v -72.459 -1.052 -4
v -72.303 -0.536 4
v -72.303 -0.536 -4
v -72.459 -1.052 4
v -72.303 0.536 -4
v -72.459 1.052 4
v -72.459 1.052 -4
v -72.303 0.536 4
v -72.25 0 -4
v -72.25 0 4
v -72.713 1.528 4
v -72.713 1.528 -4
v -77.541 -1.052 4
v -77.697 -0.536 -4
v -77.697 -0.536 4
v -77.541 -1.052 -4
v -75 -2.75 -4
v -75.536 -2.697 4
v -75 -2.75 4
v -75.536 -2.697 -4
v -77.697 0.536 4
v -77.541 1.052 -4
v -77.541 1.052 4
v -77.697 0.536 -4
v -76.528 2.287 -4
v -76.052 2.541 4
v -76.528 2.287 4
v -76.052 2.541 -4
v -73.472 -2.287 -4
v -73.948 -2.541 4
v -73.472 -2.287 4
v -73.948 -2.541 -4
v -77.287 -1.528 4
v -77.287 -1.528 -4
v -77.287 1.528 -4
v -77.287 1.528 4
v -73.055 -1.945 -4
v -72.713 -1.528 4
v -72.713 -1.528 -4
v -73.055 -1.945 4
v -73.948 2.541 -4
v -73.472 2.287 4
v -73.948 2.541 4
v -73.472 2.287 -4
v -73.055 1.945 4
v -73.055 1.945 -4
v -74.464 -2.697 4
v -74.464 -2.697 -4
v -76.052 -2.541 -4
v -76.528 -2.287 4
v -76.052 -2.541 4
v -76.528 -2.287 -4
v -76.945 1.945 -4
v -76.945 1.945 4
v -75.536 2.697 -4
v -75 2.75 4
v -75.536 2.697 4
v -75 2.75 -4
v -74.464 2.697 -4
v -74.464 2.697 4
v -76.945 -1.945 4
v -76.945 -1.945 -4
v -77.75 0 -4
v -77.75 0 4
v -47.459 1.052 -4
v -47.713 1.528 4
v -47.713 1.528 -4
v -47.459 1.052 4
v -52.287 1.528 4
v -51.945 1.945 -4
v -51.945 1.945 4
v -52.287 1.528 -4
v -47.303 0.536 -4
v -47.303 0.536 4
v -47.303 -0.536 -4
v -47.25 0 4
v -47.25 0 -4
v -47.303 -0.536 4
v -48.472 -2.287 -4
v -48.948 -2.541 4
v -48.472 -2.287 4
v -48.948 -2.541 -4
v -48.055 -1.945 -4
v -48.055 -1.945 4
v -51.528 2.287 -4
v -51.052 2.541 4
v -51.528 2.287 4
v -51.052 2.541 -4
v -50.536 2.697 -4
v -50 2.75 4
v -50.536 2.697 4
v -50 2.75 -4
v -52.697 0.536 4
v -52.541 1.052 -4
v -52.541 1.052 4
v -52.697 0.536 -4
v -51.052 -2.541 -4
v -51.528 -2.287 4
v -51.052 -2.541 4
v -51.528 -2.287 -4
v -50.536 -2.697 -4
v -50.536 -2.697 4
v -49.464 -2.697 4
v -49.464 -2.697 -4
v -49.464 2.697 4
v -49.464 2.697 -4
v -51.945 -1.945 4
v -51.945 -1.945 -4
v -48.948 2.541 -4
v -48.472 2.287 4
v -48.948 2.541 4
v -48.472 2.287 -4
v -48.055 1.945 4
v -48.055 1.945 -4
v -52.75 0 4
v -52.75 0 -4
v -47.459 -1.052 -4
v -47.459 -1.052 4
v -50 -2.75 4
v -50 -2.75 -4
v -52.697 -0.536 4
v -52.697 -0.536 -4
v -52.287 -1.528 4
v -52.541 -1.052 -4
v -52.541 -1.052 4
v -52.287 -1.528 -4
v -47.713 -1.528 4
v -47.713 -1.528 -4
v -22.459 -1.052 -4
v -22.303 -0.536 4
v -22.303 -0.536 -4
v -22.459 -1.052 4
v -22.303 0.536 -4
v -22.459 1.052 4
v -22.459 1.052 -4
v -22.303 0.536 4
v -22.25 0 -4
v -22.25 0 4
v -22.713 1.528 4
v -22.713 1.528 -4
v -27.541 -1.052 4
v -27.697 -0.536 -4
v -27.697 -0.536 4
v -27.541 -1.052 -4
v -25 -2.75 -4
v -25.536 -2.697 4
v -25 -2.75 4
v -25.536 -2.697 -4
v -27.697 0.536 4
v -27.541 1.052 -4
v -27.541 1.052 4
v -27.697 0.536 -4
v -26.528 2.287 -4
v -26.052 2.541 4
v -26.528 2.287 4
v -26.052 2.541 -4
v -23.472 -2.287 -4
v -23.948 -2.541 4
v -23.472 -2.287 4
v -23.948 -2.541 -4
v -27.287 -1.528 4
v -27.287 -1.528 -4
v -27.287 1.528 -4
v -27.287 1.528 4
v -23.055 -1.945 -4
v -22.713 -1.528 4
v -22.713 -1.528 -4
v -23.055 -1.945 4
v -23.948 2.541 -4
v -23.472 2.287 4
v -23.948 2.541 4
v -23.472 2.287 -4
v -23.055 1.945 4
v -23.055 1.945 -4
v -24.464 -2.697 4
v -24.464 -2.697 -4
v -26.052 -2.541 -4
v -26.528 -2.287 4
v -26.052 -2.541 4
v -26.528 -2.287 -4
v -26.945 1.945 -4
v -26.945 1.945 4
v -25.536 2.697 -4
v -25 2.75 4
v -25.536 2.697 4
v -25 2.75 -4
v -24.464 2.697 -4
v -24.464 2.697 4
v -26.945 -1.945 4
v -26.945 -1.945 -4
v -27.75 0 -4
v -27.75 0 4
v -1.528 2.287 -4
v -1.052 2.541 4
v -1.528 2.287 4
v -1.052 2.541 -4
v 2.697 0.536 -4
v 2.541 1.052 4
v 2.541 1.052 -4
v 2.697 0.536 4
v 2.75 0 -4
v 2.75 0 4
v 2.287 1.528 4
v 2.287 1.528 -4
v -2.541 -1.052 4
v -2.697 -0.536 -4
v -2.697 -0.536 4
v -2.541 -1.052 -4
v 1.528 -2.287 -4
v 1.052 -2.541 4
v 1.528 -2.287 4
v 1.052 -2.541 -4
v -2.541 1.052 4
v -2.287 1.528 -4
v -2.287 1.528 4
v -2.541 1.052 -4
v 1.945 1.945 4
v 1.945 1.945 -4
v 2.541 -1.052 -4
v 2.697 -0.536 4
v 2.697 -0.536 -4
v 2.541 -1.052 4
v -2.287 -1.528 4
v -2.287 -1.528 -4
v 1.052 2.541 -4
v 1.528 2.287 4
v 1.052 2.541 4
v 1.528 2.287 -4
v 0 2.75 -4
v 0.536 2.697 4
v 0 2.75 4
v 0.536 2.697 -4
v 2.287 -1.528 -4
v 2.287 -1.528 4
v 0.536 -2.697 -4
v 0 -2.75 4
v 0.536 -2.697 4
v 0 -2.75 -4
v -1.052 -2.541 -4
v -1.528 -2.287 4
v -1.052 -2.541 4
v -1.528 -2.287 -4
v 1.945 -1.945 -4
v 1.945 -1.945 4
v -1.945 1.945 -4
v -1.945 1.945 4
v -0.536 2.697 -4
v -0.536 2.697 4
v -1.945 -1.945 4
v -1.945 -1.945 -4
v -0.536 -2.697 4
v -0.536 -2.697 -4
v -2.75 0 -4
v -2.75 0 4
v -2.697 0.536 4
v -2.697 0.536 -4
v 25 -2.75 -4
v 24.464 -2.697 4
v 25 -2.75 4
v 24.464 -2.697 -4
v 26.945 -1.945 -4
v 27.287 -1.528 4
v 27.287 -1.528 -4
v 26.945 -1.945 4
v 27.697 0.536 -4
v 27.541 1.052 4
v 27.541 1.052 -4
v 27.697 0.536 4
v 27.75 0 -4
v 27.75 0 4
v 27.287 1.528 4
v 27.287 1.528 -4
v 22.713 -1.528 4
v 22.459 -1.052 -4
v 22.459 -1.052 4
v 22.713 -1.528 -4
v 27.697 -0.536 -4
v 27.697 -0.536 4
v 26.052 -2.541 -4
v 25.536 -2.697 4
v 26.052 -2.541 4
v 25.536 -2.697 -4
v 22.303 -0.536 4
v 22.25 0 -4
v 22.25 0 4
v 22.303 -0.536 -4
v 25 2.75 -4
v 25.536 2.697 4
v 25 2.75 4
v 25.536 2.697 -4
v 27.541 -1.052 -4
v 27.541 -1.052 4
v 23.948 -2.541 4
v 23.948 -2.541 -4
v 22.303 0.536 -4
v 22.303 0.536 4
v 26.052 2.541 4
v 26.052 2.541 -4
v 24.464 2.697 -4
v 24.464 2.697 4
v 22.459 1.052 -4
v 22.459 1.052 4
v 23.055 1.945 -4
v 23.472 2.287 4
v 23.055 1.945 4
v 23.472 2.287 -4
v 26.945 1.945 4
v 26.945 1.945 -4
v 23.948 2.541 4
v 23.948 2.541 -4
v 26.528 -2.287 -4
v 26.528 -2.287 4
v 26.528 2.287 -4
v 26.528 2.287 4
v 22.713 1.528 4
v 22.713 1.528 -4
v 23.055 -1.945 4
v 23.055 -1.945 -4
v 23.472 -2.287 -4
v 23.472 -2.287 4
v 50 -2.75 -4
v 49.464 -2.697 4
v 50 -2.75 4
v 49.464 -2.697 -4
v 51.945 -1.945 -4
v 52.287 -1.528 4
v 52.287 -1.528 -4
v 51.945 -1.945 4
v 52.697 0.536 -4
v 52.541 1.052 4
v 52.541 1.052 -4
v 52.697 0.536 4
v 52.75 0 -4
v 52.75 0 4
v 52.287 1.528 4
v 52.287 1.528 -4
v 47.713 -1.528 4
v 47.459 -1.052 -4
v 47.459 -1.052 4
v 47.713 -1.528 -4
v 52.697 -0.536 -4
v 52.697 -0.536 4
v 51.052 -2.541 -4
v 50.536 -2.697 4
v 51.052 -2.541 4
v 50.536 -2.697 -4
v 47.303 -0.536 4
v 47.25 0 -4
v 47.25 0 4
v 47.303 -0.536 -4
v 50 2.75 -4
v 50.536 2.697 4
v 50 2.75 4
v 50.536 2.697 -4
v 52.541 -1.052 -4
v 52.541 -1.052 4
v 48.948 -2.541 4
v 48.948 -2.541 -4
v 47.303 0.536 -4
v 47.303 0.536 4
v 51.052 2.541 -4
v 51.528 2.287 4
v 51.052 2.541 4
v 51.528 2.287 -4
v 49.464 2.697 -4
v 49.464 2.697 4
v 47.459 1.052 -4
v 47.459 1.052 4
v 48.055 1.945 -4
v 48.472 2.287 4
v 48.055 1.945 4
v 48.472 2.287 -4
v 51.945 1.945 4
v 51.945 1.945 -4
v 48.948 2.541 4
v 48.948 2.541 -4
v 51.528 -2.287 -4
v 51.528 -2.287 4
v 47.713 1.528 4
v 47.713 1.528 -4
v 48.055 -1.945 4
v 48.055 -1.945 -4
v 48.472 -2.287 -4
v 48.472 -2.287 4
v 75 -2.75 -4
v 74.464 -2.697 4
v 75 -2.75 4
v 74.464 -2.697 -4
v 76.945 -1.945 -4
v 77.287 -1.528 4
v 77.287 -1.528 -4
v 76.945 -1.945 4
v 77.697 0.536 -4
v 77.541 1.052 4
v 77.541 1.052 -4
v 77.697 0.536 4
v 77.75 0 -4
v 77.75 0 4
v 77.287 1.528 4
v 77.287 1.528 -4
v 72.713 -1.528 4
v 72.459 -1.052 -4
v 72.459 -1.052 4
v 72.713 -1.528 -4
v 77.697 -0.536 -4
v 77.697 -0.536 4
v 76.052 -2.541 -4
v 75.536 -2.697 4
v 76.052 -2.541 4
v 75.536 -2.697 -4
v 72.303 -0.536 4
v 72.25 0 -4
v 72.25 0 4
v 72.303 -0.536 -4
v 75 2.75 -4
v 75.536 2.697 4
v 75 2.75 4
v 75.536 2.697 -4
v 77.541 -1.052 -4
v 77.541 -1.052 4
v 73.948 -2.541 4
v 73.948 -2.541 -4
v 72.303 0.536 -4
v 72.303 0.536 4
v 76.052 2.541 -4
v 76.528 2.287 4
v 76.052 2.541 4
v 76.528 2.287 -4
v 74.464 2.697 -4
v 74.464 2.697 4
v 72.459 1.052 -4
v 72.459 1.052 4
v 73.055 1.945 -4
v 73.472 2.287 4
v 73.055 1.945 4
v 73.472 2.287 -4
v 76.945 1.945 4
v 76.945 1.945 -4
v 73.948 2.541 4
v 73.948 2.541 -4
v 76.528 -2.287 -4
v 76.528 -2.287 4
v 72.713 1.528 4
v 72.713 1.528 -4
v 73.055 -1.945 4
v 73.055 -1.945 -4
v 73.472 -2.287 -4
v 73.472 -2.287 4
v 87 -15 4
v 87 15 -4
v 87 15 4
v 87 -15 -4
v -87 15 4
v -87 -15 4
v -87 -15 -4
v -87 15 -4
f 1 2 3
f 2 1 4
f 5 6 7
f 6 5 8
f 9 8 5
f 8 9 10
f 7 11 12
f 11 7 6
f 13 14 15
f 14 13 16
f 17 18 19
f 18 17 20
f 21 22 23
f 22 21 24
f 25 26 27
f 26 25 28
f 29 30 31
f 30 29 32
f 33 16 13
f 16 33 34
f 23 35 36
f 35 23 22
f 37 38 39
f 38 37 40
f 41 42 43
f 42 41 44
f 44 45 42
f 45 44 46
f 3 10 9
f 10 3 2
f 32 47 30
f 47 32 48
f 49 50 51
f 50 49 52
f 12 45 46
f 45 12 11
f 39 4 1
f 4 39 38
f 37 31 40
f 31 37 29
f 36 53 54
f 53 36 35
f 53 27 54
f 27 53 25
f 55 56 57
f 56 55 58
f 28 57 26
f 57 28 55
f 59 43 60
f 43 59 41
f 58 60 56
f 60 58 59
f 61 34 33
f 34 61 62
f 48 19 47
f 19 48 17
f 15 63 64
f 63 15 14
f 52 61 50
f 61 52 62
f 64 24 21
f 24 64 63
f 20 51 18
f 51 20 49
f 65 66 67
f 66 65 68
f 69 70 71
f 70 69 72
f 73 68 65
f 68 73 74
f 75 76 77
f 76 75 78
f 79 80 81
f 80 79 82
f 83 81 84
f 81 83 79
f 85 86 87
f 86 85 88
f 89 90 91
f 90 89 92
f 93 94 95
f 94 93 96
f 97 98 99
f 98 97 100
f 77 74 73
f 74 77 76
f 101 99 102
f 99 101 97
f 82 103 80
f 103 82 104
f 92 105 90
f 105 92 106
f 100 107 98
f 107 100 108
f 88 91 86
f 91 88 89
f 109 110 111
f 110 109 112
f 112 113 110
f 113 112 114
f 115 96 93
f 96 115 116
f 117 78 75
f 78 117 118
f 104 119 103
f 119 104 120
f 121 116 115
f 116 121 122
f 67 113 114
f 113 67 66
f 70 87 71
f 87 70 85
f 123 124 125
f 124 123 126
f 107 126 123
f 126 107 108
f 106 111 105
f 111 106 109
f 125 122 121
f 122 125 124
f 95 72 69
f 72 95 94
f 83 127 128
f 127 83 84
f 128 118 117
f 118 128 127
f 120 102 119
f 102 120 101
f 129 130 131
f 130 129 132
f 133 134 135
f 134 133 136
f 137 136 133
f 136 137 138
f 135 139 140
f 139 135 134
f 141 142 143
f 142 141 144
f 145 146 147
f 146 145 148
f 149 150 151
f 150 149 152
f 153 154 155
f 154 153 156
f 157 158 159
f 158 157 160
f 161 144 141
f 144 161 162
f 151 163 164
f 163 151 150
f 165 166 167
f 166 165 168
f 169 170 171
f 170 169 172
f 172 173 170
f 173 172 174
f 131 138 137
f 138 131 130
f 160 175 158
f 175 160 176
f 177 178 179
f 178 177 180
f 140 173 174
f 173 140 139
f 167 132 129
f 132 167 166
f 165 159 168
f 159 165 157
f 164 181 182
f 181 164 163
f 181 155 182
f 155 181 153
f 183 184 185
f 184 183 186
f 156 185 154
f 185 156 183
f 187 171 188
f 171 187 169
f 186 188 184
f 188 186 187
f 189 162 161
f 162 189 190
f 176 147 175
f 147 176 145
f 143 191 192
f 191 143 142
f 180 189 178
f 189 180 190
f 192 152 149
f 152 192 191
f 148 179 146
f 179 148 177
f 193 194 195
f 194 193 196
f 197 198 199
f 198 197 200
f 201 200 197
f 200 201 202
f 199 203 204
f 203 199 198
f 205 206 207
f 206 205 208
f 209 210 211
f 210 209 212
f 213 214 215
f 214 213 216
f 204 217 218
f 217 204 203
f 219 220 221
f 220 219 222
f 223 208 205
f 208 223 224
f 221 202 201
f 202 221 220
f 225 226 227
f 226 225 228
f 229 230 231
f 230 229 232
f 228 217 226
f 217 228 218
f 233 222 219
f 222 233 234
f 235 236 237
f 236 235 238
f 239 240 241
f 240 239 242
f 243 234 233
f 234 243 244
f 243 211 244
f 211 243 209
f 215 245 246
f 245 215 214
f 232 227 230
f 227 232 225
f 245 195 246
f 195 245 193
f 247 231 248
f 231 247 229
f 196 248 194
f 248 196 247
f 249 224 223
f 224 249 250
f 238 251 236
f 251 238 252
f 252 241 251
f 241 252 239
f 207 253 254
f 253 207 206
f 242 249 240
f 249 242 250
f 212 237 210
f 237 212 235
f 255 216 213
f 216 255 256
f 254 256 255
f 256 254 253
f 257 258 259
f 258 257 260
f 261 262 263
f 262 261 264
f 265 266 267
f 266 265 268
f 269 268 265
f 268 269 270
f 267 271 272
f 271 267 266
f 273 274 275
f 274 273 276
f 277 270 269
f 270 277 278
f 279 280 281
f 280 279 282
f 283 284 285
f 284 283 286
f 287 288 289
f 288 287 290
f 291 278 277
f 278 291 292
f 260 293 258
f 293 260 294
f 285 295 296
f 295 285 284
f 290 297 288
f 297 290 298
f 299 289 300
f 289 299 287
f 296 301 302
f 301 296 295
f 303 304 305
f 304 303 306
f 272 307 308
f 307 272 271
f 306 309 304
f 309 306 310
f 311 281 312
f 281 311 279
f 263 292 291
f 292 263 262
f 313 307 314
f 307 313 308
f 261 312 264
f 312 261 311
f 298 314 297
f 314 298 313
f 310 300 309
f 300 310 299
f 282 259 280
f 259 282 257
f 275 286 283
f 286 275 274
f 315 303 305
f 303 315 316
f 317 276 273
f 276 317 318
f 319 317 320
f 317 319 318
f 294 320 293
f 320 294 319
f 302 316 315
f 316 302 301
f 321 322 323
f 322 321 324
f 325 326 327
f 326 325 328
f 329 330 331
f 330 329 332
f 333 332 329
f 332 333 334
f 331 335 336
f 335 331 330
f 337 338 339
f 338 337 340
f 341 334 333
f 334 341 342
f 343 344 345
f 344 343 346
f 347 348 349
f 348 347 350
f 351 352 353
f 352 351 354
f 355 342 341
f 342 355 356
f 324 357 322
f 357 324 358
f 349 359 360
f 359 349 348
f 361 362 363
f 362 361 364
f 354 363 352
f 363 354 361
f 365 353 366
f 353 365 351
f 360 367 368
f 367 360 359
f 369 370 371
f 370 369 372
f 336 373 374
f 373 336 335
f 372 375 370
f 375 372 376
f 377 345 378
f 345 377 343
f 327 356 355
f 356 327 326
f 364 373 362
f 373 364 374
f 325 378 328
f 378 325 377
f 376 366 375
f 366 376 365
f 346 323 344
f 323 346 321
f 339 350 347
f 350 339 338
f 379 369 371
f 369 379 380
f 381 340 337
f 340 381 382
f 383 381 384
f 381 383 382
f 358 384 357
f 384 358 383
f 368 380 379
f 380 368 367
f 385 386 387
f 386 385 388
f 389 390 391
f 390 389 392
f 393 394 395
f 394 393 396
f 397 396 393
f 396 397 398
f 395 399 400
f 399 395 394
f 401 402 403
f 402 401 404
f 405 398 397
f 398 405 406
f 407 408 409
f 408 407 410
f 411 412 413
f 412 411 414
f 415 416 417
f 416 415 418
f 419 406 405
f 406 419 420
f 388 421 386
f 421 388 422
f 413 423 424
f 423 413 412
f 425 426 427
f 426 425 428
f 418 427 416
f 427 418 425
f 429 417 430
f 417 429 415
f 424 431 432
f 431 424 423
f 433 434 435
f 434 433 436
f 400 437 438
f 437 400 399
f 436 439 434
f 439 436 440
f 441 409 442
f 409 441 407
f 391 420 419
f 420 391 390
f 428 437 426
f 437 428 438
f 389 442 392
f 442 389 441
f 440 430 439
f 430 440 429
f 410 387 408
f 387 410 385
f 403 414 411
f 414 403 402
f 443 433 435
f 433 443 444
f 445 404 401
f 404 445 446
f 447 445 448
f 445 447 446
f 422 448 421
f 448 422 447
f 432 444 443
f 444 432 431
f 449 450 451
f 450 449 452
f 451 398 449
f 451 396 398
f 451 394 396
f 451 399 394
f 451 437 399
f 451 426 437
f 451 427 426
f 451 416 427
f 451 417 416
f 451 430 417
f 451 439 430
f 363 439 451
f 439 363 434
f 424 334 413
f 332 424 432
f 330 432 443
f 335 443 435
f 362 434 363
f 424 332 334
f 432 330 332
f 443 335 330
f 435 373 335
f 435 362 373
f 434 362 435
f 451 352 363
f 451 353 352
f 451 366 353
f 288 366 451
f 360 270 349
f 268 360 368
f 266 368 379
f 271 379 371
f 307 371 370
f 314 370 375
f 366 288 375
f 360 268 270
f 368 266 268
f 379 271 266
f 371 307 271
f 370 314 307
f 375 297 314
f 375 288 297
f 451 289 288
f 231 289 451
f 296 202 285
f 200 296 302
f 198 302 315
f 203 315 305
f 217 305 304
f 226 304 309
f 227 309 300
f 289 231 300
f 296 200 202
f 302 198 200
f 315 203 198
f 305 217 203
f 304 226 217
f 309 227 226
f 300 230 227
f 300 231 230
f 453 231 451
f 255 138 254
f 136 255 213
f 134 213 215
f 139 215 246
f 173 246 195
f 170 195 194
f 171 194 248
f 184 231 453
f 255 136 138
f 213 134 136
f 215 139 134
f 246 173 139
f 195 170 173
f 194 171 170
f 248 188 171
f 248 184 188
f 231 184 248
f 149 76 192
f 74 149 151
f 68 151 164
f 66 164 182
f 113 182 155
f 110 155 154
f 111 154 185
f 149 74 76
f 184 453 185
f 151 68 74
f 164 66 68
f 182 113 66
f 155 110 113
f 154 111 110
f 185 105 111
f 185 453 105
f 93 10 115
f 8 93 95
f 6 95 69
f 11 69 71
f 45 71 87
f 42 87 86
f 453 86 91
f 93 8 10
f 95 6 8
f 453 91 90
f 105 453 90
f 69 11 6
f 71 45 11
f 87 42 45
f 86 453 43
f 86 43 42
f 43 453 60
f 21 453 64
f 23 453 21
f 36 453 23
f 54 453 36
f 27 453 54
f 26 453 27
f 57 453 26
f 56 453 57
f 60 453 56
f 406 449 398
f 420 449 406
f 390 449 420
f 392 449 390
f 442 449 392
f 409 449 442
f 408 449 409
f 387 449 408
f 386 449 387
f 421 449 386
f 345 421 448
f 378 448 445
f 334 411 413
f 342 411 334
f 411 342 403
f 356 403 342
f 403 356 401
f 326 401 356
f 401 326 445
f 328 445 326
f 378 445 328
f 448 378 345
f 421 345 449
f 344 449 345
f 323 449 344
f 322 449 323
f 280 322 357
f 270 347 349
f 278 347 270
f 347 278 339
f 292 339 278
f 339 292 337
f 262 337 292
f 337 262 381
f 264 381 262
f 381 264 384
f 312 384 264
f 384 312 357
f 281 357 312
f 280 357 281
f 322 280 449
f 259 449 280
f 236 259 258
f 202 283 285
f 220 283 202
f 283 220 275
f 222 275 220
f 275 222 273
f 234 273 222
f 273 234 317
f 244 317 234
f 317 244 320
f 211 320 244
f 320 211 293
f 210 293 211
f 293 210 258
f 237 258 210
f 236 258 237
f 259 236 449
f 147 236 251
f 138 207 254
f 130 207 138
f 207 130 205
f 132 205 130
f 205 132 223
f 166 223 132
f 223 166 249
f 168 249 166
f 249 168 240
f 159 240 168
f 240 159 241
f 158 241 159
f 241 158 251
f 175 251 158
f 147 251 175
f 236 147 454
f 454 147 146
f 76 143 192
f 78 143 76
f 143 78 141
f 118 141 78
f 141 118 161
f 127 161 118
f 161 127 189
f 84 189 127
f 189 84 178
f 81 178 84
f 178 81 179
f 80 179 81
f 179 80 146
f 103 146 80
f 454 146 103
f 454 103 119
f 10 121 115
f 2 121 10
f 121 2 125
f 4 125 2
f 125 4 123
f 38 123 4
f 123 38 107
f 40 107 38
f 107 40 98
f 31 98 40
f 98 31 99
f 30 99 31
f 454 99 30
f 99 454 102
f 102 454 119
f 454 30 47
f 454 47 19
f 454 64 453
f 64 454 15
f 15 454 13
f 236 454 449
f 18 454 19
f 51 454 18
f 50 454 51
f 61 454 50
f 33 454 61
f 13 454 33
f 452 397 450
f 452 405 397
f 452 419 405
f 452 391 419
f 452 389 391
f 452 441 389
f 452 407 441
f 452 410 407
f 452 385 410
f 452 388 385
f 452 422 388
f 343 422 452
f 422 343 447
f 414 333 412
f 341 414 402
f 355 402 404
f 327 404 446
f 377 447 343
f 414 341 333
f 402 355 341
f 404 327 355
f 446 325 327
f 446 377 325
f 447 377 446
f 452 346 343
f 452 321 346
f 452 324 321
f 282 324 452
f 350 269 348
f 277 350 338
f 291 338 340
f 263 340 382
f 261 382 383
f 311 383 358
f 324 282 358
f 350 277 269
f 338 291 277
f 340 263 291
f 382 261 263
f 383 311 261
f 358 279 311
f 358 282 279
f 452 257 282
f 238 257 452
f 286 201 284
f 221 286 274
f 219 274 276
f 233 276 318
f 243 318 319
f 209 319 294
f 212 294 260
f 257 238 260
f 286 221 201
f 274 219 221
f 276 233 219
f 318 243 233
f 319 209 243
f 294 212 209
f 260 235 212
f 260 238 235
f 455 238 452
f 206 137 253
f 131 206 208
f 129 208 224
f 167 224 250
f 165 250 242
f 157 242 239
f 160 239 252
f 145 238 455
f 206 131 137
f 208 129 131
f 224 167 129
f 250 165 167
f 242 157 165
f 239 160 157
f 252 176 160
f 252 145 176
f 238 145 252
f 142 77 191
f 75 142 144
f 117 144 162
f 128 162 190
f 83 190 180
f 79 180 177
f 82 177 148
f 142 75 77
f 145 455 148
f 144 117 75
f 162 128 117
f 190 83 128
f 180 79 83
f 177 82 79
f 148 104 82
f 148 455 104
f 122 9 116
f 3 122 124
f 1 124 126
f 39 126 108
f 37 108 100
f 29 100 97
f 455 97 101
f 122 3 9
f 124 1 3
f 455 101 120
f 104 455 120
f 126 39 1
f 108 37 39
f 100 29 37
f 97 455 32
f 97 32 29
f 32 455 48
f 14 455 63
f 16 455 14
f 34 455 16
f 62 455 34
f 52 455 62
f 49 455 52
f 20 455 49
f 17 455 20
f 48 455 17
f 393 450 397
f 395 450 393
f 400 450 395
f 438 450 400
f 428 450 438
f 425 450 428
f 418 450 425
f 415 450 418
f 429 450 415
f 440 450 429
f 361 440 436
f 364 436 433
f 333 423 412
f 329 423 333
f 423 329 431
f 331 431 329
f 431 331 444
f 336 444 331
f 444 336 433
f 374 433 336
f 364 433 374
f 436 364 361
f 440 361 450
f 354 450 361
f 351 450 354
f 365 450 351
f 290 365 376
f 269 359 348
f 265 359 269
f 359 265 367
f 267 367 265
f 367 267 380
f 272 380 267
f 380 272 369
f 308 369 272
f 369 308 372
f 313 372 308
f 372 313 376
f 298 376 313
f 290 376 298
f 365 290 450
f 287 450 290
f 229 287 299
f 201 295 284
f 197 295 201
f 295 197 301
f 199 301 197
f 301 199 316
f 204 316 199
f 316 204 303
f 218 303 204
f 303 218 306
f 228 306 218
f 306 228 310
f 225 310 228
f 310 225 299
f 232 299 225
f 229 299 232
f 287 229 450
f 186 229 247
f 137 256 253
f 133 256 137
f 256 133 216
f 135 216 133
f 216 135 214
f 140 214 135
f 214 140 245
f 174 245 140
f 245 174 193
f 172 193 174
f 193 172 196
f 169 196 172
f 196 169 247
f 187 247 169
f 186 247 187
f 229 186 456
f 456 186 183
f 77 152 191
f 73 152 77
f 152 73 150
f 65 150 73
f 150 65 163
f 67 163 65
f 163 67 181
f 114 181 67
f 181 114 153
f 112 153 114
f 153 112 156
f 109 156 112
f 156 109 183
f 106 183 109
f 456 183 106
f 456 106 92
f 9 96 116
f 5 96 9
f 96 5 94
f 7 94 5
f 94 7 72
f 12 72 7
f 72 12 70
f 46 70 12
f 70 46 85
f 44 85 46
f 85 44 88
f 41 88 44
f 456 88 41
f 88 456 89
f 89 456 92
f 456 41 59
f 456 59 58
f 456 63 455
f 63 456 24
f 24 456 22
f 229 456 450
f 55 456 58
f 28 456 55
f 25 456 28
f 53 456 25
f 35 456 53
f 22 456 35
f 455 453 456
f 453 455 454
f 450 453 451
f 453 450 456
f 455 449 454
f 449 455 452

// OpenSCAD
$fn = 32;

// ----------------------------------------------------------------------
// Hole bar, 7 x Ø5.5
// skip layout, 12 mm edge offset
// ----------------------------------------------------------------------

// --- parameters (mm) ---
bar_w = 30;         // bar width (Y)
bar_t = 8;          // bar thickness (Z)
holes = 7;          // holes per row
hole_d = 5.5;       // hole diameter
edge = 12;          // offset from the bar end to the first hole
grid_pitch = 12.5;  // grid the bar was laid out on

// --- derived feature positions (mm) ---
pitch = grid_pitch * 2;       // = 25   holes sit every other grid slot
span = (holes - 1) * pitch;   // = 150   distance between the end holes
bar_l = span + 2 * edge;      // = 174   overall bar length
start_x = -bar_l / 2 + edge;  // = -75   X of the first hole
feature_centers = [
  [start_x + 0 * pitch, 0],
  [start_x + 1 * pitch, 0],
  [start_x + 2 * pitch, 0],
  [start_x + 3 * pitch, 0],
  [start_x + 4 * pitch, 0],
  [start_x + 5 * pitch, 0],
  [start_x + 6 * pitch, 0]
];   // hole centres of the first row

// bar with one row of holes, drilled from feature_centers
difference() {
  translate([-bar_l / 2, -bar_w / 2, -bar_t / 2]) cube([bar_l, bar_w, bar_t]);
  for (centre = feature_centers)
    translate([centre[0], centre[1], 0])
      cylinder(d = hole_d, h = bar_t + 2, center = true);
}
